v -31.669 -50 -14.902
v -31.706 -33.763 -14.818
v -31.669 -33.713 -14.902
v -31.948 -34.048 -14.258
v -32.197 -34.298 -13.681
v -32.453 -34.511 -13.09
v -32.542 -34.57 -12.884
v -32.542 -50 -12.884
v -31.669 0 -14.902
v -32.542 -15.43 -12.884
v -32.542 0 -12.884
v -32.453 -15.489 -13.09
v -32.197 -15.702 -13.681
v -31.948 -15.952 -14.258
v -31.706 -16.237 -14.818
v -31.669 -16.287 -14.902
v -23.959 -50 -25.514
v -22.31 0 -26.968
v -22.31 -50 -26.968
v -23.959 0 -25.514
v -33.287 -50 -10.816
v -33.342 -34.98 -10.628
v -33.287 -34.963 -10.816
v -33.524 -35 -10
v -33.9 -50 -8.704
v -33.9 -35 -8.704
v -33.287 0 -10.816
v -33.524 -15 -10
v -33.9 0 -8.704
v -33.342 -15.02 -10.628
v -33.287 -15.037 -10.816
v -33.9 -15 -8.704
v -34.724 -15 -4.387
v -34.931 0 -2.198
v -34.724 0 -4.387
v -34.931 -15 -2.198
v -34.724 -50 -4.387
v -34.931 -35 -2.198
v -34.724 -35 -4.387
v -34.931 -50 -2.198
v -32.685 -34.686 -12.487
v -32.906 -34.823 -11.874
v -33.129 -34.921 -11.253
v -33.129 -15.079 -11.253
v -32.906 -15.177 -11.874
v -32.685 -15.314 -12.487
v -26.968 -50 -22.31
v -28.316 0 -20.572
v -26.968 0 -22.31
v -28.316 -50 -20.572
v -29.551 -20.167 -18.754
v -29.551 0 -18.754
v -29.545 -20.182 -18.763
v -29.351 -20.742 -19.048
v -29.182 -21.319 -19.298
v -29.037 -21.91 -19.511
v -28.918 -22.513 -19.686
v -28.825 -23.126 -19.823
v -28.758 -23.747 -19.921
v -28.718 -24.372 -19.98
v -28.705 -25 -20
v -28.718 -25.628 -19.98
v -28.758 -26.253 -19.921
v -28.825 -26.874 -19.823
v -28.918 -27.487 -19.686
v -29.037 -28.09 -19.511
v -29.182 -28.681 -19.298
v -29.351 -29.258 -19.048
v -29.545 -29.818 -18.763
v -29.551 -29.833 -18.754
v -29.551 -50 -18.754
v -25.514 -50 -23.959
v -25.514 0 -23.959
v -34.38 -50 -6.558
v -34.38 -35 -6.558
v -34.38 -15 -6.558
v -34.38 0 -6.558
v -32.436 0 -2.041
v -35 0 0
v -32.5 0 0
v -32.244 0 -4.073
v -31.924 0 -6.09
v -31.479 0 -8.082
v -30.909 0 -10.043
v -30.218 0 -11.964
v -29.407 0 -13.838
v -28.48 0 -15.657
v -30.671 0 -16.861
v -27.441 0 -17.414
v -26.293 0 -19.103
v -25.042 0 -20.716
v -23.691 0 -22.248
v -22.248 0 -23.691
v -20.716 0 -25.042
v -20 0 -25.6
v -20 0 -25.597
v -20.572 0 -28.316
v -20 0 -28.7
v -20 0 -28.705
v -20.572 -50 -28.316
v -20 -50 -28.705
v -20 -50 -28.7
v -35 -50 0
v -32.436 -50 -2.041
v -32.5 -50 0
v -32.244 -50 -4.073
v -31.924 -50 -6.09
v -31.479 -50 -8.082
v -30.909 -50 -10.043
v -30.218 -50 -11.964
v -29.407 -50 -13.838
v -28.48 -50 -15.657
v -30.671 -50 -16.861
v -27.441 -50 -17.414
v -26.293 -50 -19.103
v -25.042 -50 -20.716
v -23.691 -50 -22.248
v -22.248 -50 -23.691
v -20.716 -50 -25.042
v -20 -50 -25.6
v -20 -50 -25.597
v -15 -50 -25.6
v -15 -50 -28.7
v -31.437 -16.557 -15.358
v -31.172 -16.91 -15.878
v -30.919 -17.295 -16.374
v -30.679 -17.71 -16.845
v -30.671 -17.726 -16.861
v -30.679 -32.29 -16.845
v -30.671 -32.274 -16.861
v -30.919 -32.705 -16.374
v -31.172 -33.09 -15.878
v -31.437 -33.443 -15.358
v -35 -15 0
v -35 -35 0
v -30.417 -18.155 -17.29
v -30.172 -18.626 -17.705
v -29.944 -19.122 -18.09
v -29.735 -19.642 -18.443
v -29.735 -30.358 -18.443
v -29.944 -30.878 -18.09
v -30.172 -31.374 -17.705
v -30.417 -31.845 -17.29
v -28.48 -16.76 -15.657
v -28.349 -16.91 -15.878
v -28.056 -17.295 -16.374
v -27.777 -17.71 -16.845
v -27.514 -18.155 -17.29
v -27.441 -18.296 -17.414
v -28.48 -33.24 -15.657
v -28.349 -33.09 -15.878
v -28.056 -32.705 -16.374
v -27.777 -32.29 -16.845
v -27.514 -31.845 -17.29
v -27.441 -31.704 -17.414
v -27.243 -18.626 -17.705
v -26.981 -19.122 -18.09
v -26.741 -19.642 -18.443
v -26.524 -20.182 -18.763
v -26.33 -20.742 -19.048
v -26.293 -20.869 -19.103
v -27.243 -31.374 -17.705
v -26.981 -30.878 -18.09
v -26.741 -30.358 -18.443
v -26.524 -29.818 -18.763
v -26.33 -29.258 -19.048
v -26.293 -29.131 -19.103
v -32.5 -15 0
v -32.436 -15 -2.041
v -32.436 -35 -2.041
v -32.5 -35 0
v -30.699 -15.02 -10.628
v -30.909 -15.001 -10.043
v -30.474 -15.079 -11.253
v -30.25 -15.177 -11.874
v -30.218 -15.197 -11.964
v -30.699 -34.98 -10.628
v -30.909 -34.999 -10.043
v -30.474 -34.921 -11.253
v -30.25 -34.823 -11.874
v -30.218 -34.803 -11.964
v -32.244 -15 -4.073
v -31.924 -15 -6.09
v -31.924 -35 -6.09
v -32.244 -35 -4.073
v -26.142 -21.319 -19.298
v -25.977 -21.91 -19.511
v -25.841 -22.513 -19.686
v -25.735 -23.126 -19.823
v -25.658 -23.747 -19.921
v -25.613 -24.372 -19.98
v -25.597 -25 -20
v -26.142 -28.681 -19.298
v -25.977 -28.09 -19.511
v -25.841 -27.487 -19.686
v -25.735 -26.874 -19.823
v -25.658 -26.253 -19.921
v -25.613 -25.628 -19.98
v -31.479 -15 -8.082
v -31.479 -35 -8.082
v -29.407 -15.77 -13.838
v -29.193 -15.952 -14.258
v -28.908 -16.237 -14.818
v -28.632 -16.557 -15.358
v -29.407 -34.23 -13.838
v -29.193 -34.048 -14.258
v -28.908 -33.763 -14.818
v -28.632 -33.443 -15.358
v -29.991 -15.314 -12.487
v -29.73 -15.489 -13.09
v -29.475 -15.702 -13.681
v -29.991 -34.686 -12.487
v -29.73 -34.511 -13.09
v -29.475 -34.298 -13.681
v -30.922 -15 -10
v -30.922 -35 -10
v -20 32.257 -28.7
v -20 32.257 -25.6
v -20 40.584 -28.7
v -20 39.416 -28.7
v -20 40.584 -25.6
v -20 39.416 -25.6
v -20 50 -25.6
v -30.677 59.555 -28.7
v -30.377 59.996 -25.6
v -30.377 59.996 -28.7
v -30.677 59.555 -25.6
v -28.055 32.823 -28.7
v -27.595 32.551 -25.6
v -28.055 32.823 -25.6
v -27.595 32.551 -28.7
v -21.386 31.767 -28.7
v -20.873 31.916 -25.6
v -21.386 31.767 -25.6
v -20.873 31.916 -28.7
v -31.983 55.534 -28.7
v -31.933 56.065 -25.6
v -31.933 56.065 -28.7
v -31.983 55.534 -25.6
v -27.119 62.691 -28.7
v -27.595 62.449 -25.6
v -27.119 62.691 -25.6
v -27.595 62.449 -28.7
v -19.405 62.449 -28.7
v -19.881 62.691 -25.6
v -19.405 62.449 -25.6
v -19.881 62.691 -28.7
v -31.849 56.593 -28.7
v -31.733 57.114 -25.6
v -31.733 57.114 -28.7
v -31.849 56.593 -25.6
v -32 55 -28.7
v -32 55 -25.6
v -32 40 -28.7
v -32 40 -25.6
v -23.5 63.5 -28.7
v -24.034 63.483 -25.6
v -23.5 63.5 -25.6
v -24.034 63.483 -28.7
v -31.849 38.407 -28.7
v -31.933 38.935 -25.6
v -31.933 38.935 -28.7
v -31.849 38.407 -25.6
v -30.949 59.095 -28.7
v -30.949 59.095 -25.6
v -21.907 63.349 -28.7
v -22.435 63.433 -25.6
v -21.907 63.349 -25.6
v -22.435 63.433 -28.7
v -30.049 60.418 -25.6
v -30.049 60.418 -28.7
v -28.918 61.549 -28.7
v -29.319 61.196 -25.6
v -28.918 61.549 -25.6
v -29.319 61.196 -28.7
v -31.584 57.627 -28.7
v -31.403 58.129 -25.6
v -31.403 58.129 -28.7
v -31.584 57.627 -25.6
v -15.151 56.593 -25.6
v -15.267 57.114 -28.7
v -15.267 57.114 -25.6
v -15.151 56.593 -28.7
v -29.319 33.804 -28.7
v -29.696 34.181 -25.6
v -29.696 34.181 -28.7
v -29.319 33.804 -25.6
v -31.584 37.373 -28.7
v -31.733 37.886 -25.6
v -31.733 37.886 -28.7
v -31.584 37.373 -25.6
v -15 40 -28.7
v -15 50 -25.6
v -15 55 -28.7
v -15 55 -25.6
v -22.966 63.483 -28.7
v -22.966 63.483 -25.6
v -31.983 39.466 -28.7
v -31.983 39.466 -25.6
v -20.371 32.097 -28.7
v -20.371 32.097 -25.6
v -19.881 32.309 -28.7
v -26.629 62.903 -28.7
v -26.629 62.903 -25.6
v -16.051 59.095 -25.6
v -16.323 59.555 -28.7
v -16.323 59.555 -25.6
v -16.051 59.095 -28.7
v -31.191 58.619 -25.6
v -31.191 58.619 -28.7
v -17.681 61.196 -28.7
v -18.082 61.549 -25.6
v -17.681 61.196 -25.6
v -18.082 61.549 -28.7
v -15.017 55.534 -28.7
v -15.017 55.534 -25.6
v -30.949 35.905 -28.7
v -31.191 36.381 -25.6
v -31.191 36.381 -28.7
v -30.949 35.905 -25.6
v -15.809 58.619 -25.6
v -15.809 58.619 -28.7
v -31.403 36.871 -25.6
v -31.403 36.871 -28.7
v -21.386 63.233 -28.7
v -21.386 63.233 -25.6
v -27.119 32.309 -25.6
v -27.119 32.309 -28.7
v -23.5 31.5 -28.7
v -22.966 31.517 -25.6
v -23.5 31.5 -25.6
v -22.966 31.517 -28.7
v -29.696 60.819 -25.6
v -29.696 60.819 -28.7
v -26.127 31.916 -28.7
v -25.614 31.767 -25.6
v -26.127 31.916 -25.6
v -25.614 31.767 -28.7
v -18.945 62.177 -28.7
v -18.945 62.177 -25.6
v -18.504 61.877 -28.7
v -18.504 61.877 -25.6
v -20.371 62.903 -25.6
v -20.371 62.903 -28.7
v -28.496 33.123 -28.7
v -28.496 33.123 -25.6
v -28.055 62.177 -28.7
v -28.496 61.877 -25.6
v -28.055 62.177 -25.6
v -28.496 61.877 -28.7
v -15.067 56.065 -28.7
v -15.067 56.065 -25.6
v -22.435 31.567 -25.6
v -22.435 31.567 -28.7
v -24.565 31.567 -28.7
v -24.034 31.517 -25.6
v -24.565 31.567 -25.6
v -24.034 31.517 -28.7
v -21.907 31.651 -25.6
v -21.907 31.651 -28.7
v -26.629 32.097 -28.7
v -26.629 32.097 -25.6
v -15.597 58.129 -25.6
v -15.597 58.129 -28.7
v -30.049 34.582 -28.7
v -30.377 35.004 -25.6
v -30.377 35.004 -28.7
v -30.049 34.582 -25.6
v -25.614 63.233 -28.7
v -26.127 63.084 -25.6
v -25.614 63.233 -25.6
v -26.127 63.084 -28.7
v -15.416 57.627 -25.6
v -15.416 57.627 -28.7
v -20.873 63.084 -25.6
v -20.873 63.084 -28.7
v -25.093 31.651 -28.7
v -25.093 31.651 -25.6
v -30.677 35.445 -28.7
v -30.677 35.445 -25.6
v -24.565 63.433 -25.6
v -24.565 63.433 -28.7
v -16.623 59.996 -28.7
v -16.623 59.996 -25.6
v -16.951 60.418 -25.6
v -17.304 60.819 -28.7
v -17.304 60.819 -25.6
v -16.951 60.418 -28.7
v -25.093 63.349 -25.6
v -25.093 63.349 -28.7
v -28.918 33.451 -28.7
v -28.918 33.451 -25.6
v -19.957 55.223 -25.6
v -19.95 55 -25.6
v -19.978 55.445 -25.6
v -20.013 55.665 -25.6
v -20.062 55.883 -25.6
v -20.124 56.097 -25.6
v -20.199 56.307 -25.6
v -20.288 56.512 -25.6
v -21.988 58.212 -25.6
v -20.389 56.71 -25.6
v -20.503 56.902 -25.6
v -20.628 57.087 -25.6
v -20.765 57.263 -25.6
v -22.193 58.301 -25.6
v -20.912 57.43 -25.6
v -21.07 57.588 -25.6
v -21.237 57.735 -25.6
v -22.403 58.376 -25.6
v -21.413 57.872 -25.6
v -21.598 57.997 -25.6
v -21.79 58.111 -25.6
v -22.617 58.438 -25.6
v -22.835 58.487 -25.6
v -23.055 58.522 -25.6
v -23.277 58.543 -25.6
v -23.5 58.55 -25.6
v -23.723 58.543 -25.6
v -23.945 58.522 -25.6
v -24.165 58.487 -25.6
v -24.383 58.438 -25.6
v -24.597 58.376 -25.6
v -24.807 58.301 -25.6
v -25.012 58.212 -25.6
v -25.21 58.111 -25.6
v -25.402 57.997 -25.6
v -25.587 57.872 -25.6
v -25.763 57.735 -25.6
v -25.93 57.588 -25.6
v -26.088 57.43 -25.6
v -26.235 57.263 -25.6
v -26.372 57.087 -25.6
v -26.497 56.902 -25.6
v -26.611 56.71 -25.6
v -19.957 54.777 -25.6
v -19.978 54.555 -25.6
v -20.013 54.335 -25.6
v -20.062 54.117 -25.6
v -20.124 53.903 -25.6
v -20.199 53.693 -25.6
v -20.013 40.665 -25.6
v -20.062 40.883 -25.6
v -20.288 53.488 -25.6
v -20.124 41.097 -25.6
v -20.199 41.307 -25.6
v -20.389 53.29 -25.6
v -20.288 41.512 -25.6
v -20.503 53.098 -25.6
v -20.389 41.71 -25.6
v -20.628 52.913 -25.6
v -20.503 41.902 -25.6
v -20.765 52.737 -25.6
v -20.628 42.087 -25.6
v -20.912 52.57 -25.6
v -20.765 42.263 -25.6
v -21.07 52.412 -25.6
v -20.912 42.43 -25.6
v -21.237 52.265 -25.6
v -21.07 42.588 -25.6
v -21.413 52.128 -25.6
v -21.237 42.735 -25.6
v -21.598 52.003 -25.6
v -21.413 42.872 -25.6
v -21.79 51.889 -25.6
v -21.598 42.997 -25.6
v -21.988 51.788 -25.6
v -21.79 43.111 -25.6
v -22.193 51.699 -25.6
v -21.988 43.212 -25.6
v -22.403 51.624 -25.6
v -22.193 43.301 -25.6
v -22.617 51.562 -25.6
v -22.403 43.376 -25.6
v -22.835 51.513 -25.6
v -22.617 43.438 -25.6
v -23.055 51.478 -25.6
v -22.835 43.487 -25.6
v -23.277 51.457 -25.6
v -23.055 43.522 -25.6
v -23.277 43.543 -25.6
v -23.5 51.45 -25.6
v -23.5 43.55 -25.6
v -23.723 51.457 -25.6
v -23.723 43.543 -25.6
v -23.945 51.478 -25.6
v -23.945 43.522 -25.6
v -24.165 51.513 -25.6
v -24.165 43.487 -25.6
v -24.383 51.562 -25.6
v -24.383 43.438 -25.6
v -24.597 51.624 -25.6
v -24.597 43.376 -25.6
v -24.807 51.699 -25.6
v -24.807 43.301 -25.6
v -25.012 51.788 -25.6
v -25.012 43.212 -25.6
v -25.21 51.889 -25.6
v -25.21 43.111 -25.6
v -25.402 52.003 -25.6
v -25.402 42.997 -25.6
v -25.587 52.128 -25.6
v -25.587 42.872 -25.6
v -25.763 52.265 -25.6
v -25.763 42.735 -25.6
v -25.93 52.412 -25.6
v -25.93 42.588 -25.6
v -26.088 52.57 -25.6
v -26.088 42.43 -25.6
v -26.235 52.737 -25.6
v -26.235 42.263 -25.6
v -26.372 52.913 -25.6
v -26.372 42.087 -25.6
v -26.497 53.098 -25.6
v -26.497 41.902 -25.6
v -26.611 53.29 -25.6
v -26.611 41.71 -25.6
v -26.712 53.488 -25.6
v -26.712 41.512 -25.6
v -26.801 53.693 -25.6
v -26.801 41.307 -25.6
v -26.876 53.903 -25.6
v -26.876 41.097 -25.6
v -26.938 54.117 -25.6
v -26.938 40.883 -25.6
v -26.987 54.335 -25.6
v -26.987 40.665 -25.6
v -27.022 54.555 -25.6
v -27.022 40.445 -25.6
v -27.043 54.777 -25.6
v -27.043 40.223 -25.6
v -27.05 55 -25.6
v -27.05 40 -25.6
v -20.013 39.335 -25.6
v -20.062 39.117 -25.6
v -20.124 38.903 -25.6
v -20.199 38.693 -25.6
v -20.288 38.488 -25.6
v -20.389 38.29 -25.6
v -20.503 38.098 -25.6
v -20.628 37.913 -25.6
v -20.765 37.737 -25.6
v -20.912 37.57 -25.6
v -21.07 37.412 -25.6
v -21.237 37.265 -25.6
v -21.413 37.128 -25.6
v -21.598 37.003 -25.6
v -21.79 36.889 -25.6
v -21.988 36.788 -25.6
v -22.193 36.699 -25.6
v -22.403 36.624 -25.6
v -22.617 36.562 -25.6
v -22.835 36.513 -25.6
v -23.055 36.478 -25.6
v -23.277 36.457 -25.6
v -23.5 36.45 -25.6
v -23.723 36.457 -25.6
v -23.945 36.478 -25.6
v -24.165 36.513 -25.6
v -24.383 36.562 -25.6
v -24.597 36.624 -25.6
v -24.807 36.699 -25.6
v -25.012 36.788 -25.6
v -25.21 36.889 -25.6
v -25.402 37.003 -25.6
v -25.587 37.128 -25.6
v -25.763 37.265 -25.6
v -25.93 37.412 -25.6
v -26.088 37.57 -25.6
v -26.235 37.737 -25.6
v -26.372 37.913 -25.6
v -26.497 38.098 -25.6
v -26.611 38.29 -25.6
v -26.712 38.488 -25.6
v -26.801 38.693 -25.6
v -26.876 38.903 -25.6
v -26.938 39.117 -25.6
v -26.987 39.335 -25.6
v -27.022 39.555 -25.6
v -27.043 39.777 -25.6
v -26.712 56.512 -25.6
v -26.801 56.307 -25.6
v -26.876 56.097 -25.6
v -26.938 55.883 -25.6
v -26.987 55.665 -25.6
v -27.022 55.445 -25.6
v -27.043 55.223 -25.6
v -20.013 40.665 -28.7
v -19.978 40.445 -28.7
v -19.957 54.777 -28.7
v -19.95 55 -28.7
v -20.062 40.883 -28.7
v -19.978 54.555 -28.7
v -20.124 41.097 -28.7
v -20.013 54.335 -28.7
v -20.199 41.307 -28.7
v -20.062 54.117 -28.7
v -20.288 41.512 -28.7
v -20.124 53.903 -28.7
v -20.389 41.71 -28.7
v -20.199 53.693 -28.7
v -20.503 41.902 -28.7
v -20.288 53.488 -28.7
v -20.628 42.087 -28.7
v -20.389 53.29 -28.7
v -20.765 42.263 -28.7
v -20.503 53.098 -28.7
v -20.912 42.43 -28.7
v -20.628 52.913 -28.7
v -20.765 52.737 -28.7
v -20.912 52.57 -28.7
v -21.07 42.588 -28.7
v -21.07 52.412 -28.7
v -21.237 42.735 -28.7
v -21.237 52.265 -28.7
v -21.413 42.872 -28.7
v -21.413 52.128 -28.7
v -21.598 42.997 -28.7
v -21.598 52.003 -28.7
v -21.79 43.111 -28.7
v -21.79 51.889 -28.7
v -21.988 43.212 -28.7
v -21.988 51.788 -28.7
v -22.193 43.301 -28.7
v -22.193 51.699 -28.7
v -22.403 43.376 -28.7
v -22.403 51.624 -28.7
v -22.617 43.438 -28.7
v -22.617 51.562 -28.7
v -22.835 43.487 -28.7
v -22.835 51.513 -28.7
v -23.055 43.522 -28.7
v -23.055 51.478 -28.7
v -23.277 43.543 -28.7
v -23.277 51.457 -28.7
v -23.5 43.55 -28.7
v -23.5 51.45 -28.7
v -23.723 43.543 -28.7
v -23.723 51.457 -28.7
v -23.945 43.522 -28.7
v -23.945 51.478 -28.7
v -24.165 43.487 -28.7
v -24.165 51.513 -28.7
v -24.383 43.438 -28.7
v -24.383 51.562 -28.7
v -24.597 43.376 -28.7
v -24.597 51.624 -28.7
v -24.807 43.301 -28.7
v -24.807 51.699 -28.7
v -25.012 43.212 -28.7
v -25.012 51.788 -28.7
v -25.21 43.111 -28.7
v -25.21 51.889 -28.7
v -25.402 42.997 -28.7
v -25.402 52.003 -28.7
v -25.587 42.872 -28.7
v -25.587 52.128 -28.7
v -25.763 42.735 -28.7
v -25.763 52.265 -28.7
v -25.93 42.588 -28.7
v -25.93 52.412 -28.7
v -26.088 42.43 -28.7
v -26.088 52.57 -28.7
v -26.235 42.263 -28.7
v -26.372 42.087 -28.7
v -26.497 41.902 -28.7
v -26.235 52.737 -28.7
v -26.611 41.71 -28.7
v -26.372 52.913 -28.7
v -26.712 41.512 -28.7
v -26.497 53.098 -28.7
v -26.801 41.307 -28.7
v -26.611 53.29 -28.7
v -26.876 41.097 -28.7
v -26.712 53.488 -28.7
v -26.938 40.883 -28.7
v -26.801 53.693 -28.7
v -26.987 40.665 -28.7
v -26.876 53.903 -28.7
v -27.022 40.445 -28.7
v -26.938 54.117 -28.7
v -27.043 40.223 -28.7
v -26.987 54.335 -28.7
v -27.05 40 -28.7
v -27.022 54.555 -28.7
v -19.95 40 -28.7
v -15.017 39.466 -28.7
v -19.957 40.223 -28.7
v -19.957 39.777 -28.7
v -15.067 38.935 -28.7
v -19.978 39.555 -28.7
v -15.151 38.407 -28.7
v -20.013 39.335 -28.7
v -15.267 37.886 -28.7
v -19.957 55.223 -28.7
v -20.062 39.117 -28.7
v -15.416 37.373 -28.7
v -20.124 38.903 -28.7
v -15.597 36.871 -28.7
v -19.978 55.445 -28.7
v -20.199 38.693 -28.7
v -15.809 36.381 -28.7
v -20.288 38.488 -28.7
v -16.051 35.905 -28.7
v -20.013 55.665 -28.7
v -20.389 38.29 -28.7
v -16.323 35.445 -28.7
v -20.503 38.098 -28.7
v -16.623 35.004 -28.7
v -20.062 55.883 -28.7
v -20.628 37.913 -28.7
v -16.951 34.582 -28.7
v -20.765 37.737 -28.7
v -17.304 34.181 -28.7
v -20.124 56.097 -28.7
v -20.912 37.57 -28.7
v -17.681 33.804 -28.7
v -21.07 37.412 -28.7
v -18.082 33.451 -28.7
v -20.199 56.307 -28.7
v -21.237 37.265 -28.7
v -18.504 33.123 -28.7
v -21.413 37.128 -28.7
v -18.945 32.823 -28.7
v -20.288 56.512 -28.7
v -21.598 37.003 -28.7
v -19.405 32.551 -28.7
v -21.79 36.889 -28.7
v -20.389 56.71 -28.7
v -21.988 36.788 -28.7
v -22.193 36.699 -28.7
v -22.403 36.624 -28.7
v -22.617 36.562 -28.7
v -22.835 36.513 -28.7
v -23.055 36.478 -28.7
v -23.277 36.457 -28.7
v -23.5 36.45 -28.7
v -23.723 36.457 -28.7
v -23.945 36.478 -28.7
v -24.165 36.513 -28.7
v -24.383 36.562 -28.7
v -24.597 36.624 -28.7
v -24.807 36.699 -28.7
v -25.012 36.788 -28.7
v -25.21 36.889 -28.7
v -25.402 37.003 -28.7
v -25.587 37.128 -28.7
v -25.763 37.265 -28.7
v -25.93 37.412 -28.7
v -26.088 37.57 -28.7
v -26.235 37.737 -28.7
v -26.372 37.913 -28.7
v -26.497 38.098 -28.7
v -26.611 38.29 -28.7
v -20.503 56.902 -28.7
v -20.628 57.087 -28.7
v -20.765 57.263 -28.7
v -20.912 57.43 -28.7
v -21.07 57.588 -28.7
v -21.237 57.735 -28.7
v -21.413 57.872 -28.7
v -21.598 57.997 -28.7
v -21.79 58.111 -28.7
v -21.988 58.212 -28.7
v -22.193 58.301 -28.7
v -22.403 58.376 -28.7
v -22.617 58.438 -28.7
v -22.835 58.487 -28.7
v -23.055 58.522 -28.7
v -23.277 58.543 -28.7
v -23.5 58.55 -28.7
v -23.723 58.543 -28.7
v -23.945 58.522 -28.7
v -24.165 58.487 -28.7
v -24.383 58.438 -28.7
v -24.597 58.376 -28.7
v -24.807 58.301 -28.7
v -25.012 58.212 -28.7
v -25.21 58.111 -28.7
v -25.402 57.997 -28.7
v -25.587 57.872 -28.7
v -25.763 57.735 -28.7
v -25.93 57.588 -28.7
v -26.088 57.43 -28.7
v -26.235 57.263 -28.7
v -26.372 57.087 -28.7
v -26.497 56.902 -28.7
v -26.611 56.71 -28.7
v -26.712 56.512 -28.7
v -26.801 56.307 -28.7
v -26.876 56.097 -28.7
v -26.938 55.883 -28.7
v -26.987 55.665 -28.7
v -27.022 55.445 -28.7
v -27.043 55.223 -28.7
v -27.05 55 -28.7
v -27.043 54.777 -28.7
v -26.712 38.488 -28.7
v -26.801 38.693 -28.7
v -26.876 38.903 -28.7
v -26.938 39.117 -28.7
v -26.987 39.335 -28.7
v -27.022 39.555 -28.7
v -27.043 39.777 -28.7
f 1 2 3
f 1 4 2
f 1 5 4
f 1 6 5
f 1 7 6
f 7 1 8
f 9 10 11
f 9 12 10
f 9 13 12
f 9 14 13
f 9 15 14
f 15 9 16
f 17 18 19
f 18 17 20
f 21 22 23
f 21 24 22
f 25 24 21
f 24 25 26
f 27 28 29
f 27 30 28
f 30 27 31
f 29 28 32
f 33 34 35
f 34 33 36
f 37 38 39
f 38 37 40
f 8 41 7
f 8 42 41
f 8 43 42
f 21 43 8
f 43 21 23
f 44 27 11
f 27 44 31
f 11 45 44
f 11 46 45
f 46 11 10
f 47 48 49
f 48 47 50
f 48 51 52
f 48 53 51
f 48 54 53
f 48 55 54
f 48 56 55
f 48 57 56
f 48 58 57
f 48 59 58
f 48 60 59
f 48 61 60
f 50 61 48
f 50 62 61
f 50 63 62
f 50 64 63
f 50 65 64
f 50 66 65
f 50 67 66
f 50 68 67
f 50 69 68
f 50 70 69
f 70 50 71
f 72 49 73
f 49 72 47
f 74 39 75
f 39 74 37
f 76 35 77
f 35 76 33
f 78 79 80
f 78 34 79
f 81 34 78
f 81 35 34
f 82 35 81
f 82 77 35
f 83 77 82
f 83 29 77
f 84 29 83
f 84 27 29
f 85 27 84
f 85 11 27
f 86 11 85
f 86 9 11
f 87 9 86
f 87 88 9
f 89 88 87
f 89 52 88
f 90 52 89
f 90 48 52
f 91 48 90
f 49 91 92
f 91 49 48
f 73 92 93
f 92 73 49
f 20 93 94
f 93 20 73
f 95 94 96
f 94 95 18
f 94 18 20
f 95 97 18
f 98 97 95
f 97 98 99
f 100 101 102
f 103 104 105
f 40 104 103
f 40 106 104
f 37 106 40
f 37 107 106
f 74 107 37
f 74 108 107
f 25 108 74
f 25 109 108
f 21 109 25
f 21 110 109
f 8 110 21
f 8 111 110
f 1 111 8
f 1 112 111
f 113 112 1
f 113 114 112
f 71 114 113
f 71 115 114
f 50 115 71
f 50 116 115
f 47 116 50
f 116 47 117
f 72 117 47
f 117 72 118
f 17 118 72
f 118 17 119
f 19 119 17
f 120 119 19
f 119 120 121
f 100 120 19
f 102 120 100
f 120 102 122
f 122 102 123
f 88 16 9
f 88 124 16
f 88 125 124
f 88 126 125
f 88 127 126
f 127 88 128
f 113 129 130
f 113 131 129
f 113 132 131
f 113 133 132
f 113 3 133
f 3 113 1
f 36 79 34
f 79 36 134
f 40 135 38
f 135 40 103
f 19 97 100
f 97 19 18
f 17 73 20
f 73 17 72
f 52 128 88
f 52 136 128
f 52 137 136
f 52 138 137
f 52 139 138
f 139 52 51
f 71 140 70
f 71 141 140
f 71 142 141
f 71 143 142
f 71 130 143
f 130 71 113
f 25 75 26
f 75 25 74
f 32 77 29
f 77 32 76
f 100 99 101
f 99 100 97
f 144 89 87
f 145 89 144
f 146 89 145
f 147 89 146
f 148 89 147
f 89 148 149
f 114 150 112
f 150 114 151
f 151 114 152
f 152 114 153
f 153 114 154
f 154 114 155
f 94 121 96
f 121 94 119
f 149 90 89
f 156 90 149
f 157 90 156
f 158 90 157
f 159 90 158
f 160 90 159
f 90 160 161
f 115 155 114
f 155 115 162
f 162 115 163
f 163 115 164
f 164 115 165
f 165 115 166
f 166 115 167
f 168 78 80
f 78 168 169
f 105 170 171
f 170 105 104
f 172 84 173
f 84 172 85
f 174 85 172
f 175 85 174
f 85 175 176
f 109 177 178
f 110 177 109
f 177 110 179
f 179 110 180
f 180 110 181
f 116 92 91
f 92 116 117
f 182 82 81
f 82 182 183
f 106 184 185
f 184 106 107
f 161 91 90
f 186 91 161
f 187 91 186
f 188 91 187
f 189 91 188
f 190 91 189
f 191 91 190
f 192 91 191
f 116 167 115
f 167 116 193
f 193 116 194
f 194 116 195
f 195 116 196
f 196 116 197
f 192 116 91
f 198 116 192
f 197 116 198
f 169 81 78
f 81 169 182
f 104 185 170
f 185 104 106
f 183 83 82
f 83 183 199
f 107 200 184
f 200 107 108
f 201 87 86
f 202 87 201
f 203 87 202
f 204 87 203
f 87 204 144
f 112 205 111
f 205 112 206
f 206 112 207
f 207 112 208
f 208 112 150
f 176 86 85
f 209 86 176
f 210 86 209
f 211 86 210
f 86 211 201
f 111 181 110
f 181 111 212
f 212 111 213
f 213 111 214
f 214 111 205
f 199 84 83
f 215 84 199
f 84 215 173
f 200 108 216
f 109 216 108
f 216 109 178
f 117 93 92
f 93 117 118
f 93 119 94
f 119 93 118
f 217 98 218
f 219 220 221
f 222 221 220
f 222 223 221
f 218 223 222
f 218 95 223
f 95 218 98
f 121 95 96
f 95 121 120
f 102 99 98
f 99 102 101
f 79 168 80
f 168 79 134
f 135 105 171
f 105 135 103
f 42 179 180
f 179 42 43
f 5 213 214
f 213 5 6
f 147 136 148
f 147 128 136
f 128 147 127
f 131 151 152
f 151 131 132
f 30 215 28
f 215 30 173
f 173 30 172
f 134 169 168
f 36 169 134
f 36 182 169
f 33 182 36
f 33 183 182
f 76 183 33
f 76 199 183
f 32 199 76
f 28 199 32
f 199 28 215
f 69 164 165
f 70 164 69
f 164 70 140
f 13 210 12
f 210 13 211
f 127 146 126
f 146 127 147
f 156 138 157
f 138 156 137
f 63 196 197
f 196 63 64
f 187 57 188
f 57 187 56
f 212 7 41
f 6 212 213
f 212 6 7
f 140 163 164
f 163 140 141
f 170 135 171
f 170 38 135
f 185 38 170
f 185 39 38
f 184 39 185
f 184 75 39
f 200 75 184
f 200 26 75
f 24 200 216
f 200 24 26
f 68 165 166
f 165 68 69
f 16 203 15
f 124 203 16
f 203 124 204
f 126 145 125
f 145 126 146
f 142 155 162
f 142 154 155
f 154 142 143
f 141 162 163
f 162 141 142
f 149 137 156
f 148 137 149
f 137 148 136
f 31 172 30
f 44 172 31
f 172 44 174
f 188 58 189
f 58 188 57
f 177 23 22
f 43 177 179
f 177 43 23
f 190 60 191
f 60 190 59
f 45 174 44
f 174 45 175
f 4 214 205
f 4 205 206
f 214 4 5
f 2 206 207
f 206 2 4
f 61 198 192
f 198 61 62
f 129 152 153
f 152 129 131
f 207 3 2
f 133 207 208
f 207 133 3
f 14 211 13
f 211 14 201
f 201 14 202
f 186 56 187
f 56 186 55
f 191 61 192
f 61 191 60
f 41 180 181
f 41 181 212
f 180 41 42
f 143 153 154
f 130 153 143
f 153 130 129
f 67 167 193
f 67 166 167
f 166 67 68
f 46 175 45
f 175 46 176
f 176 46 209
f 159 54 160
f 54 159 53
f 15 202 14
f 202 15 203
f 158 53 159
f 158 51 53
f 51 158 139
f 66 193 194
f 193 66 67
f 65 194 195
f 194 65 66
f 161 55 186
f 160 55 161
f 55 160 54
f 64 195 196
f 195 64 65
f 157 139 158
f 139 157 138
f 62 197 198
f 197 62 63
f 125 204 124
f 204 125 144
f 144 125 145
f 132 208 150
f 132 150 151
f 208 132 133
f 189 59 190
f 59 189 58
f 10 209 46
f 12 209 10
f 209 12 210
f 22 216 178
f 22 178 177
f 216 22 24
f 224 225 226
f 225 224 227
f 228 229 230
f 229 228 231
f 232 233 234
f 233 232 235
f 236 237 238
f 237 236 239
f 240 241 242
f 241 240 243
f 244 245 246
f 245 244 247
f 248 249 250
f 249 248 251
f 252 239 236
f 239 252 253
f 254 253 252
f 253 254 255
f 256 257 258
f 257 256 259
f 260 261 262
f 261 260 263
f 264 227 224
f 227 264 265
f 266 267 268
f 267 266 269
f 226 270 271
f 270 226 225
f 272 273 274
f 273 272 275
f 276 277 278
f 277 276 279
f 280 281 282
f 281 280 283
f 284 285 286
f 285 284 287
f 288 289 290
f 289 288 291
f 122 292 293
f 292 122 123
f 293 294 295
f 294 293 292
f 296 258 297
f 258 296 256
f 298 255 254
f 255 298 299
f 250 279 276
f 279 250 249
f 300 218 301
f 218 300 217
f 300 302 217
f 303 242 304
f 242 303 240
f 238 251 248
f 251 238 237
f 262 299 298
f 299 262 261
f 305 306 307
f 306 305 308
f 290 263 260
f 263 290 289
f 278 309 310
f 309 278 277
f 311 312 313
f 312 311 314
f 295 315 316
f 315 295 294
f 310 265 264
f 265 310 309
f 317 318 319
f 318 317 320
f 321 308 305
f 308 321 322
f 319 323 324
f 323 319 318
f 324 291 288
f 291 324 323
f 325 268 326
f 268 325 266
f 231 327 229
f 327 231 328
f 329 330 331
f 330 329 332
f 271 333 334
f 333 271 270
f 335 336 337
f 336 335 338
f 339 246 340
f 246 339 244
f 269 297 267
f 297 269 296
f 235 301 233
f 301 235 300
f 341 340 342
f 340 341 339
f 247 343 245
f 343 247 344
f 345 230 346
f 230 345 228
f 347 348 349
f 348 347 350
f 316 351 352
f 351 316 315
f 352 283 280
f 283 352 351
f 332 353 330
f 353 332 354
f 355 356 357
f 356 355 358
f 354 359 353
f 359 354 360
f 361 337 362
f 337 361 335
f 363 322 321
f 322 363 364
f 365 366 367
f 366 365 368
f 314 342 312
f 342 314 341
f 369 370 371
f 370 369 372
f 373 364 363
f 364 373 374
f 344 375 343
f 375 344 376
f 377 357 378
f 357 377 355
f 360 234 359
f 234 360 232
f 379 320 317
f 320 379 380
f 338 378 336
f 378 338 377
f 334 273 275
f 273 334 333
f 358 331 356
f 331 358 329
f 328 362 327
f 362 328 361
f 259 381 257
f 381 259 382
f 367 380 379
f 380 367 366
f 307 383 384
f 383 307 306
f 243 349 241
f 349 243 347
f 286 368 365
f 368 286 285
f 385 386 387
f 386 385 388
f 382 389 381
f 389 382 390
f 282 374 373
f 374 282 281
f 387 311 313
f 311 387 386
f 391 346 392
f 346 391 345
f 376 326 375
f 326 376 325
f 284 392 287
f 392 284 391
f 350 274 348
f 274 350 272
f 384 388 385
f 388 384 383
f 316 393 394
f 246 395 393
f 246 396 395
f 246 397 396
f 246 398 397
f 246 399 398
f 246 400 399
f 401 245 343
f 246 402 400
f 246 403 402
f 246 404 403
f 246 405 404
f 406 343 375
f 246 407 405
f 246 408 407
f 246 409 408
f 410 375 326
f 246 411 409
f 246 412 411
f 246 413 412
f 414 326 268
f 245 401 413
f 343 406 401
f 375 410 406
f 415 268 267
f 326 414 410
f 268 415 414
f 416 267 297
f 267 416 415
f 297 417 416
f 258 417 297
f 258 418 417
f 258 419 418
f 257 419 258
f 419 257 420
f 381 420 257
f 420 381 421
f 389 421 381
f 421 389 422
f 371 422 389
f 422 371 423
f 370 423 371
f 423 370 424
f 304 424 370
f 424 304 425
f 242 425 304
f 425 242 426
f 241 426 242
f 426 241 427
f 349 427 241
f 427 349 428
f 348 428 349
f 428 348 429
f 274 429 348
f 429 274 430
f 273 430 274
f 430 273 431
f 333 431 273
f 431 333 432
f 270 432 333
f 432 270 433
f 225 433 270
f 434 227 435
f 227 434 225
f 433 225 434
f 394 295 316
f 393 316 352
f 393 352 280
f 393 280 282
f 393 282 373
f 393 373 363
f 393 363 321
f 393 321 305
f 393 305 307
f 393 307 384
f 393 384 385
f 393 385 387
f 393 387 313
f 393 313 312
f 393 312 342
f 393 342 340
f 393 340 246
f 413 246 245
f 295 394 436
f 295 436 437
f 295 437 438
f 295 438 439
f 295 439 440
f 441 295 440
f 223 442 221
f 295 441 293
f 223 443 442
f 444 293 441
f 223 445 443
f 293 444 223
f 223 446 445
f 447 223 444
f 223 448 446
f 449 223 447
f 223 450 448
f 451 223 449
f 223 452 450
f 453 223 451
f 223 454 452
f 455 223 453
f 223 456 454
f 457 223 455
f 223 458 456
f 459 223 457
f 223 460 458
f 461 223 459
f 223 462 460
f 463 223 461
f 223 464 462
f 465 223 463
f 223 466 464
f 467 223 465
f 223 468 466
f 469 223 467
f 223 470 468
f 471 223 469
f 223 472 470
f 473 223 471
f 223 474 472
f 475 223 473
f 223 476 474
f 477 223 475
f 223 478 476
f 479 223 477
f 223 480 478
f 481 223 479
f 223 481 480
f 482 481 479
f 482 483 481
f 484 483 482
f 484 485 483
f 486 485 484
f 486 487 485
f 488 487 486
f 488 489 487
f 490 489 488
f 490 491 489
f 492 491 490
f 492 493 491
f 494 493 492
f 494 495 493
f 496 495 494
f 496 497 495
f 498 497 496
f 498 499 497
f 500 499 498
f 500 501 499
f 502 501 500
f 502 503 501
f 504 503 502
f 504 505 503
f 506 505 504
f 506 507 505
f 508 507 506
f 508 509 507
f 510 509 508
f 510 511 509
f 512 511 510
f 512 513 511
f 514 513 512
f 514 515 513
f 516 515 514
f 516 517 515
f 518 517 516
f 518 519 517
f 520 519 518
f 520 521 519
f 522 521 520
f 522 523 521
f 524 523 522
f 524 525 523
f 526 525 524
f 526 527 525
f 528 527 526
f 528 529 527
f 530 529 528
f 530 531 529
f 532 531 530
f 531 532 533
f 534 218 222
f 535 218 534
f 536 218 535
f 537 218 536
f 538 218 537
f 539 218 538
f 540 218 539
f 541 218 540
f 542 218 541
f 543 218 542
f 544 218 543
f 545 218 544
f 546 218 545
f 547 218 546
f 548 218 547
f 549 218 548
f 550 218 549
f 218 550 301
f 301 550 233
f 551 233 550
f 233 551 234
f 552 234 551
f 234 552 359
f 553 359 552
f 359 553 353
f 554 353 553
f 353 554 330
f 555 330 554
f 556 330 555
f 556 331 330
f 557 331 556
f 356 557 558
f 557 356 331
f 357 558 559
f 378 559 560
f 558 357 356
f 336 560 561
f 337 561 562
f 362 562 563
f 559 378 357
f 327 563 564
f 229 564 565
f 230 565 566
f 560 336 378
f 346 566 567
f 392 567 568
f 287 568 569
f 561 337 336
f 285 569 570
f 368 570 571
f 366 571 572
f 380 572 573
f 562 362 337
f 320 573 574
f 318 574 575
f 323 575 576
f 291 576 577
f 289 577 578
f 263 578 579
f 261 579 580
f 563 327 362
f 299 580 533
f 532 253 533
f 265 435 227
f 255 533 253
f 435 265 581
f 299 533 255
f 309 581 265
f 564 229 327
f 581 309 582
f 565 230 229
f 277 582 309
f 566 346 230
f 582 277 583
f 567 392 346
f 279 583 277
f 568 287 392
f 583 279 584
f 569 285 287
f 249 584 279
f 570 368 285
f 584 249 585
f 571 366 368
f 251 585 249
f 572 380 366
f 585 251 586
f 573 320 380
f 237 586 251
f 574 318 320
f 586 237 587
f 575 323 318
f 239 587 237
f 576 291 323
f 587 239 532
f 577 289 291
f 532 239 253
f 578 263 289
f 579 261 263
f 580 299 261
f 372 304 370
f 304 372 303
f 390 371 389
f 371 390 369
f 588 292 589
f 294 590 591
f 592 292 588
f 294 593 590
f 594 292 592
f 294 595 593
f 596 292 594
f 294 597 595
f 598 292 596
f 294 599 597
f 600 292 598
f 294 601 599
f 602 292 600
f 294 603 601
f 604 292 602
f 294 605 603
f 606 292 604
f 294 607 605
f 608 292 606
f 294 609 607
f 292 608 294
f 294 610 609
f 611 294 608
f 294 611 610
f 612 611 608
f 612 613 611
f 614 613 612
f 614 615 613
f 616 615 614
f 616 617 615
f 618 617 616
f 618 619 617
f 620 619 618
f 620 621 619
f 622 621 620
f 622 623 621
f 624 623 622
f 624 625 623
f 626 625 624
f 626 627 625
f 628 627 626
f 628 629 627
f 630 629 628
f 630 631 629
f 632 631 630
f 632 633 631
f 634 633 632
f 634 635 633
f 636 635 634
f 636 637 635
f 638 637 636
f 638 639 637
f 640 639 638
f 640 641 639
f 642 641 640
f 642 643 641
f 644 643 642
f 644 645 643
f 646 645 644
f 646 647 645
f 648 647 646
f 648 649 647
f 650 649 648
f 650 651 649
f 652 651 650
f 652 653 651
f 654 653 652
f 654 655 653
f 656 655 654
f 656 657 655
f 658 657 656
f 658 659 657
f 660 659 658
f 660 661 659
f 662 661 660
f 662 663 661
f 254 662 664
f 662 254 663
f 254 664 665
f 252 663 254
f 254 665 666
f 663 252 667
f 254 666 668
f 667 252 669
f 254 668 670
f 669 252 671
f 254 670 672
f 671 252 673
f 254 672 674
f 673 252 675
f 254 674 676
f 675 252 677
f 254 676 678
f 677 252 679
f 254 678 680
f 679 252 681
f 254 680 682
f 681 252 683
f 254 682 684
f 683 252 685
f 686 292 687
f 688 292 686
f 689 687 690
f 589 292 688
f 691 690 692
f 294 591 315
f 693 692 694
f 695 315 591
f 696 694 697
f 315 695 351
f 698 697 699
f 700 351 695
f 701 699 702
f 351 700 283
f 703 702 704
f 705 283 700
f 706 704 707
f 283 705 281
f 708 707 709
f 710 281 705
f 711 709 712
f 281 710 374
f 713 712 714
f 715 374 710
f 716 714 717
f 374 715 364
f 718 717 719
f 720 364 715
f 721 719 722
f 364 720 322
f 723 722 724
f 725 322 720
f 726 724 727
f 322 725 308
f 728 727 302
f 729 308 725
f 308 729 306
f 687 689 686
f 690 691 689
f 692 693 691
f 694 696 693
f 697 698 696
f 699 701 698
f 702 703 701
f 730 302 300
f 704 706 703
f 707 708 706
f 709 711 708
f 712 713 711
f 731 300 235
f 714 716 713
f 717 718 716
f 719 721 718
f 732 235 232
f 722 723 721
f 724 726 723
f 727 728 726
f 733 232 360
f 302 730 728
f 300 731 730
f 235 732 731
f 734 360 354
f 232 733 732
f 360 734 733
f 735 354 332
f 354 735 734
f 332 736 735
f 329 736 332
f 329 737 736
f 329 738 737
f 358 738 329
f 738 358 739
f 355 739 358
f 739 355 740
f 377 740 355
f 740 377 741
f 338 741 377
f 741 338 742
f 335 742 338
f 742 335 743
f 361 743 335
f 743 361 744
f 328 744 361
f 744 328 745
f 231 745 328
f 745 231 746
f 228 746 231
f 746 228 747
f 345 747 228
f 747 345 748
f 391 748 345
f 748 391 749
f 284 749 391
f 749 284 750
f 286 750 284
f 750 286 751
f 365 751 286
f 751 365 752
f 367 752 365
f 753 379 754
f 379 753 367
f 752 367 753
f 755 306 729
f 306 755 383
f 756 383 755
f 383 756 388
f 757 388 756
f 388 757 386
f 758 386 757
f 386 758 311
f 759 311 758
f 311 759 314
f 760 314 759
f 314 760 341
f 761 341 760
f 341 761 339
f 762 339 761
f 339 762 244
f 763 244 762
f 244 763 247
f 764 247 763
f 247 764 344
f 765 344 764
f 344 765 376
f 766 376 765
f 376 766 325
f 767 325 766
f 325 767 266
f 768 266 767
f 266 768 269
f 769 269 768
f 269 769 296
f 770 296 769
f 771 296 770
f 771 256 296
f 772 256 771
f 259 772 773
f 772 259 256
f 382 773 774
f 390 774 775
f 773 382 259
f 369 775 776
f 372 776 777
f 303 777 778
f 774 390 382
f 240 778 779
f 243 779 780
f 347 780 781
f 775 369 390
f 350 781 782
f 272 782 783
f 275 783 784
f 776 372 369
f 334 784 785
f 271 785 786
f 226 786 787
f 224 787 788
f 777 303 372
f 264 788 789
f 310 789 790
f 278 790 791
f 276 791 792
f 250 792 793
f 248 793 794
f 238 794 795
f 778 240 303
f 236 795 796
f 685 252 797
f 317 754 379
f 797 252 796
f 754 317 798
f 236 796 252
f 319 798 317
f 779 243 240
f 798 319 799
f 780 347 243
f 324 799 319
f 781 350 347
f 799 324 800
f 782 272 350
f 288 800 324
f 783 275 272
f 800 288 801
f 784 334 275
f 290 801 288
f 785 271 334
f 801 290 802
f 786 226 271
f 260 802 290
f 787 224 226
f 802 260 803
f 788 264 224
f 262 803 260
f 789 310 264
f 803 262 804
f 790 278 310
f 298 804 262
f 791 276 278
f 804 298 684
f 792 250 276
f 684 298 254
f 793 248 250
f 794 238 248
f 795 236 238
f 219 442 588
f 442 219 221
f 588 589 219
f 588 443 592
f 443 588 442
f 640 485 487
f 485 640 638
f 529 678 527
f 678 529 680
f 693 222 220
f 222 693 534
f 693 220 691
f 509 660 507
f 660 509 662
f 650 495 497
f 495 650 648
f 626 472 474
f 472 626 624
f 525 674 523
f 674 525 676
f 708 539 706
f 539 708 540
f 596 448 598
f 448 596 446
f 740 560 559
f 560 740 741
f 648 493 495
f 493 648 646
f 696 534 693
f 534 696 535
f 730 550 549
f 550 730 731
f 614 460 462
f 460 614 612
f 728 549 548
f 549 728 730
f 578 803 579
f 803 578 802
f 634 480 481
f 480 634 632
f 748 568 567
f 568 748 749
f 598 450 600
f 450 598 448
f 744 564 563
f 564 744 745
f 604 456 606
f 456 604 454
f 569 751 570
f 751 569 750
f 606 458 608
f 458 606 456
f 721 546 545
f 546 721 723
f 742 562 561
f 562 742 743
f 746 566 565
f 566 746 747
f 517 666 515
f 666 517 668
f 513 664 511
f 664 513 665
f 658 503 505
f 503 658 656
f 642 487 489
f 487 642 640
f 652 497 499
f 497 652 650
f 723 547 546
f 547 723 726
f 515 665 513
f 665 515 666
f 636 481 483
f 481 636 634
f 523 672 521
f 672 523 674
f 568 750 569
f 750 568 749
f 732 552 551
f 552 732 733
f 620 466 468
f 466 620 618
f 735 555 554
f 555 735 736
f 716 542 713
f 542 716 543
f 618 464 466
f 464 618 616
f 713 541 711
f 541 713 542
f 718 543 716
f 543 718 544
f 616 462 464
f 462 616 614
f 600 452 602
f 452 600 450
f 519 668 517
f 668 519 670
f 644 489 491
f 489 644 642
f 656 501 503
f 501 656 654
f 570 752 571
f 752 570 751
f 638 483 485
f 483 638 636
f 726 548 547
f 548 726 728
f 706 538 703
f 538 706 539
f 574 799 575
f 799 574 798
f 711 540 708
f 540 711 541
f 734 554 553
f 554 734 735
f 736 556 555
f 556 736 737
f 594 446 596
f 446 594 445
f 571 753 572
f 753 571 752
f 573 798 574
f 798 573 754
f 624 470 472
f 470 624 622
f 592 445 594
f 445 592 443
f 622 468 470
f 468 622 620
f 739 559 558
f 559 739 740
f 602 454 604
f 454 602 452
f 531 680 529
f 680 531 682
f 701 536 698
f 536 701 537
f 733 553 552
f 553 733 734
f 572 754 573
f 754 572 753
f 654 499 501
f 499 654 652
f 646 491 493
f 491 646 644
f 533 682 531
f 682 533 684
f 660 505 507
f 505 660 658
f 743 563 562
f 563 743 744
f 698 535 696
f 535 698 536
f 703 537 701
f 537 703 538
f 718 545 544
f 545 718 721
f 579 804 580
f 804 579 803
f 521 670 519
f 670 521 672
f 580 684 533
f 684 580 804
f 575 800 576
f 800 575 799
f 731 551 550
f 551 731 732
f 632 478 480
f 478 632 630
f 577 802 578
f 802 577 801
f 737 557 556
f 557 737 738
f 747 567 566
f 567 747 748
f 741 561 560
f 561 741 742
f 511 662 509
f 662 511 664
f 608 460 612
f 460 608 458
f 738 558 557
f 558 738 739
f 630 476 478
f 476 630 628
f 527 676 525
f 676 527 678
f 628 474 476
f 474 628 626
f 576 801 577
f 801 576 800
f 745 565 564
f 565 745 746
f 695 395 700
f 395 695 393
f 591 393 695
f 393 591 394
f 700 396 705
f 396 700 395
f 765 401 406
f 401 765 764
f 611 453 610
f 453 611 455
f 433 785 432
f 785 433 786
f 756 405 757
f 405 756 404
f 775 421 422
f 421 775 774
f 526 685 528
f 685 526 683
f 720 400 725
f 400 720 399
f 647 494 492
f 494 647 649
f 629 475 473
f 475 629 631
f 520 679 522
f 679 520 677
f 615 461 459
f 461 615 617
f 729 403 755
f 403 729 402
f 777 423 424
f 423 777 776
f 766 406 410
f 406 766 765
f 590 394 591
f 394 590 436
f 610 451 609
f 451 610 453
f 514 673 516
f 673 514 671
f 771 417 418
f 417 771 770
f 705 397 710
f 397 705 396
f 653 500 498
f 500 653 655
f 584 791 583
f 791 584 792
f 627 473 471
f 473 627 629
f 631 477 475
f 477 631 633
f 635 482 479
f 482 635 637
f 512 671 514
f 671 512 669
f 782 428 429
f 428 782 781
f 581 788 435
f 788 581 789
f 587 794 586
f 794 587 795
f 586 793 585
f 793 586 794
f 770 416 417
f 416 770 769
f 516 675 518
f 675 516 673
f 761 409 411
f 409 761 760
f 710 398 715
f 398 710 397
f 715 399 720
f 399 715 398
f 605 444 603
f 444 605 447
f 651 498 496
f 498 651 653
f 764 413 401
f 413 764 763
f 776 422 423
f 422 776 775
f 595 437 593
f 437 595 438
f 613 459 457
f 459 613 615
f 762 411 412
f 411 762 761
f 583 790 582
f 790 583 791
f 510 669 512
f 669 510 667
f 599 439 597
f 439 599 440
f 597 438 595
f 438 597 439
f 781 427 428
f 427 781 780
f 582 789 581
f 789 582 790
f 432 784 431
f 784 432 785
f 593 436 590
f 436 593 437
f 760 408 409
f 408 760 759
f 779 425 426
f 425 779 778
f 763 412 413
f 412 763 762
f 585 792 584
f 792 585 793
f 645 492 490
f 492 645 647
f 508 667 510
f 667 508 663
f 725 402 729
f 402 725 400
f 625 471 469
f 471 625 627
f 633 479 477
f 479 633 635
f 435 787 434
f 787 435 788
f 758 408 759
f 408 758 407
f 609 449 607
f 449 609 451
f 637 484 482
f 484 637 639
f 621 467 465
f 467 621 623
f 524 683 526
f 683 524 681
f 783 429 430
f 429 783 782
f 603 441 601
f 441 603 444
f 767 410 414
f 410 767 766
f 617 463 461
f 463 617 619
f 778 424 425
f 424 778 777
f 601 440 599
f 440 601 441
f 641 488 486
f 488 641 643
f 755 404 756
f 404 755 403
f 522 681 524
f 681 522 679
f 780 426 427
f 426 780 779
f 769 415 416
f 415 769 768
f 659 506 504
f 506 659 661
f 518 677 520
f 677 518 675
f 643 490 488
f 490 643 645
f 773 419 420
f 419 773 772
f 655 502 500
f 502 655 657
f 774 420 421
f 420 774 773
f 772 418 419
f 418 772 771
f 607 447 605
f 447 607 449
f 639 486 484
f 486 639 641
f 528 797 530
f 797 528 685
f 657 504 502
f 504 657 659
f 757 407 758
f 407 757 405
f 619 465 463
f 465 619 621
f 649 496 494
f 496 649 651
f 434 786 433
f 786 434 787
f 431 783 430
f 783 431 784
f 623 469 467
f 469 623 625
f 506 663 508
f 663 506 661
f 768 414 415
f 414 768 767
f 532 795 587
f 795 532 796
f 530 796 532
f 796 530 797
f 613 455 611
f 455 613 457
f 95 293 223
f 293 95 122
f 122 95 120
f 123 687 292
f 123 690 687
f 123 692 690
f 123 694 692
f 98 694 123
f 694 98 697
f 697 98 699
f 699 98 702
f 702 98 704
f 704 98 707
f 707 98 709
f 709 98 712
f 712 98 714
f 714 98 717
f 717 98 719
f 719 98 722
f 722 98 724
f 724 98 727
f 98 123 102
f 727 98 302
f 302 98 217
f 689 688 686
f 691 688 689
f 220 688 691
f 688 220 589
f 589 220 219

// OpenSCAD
$fn = 100;

difference(){
union(){
difference(){
rotate([90,0,0]){
cylinder(h=50,d=70);
}

translate([0,3,0]){
rotate([90,0,0]){
cylinder(h=56,d=65);
}
}

}

}

translate([-20,-60,-40]){
cube([70,70,100]);
}

translate([-40,-60,0]){
cube([70,70,70]);
}

hull(){
translate([-50,-25,0]){
rotate([0,90,0]){
cylinder(h=30,d=20);
}
}

translate([-50,-25,-10]){
rotate([0,90,0]){
cylinder(h=30,d=20);
}
}
}
}

translate([-20,-50,-28.7]){
cube([5,100,3.1]);
}

translate([-3.5,-10,1.3]){
union(){
translate([-20,50,-30]){
difference(){
hull(){
cylinder(h=3.1,d=17);
translate([0,15,0]){
cylinder(h=3.1,d=17);
}
}

translate([0,0,-3]){
cylinder(h=8,d=7.1);
}
translate([0,15,-3]){
cylinder(h=8,d=7.1);
}
}
}
}
}
